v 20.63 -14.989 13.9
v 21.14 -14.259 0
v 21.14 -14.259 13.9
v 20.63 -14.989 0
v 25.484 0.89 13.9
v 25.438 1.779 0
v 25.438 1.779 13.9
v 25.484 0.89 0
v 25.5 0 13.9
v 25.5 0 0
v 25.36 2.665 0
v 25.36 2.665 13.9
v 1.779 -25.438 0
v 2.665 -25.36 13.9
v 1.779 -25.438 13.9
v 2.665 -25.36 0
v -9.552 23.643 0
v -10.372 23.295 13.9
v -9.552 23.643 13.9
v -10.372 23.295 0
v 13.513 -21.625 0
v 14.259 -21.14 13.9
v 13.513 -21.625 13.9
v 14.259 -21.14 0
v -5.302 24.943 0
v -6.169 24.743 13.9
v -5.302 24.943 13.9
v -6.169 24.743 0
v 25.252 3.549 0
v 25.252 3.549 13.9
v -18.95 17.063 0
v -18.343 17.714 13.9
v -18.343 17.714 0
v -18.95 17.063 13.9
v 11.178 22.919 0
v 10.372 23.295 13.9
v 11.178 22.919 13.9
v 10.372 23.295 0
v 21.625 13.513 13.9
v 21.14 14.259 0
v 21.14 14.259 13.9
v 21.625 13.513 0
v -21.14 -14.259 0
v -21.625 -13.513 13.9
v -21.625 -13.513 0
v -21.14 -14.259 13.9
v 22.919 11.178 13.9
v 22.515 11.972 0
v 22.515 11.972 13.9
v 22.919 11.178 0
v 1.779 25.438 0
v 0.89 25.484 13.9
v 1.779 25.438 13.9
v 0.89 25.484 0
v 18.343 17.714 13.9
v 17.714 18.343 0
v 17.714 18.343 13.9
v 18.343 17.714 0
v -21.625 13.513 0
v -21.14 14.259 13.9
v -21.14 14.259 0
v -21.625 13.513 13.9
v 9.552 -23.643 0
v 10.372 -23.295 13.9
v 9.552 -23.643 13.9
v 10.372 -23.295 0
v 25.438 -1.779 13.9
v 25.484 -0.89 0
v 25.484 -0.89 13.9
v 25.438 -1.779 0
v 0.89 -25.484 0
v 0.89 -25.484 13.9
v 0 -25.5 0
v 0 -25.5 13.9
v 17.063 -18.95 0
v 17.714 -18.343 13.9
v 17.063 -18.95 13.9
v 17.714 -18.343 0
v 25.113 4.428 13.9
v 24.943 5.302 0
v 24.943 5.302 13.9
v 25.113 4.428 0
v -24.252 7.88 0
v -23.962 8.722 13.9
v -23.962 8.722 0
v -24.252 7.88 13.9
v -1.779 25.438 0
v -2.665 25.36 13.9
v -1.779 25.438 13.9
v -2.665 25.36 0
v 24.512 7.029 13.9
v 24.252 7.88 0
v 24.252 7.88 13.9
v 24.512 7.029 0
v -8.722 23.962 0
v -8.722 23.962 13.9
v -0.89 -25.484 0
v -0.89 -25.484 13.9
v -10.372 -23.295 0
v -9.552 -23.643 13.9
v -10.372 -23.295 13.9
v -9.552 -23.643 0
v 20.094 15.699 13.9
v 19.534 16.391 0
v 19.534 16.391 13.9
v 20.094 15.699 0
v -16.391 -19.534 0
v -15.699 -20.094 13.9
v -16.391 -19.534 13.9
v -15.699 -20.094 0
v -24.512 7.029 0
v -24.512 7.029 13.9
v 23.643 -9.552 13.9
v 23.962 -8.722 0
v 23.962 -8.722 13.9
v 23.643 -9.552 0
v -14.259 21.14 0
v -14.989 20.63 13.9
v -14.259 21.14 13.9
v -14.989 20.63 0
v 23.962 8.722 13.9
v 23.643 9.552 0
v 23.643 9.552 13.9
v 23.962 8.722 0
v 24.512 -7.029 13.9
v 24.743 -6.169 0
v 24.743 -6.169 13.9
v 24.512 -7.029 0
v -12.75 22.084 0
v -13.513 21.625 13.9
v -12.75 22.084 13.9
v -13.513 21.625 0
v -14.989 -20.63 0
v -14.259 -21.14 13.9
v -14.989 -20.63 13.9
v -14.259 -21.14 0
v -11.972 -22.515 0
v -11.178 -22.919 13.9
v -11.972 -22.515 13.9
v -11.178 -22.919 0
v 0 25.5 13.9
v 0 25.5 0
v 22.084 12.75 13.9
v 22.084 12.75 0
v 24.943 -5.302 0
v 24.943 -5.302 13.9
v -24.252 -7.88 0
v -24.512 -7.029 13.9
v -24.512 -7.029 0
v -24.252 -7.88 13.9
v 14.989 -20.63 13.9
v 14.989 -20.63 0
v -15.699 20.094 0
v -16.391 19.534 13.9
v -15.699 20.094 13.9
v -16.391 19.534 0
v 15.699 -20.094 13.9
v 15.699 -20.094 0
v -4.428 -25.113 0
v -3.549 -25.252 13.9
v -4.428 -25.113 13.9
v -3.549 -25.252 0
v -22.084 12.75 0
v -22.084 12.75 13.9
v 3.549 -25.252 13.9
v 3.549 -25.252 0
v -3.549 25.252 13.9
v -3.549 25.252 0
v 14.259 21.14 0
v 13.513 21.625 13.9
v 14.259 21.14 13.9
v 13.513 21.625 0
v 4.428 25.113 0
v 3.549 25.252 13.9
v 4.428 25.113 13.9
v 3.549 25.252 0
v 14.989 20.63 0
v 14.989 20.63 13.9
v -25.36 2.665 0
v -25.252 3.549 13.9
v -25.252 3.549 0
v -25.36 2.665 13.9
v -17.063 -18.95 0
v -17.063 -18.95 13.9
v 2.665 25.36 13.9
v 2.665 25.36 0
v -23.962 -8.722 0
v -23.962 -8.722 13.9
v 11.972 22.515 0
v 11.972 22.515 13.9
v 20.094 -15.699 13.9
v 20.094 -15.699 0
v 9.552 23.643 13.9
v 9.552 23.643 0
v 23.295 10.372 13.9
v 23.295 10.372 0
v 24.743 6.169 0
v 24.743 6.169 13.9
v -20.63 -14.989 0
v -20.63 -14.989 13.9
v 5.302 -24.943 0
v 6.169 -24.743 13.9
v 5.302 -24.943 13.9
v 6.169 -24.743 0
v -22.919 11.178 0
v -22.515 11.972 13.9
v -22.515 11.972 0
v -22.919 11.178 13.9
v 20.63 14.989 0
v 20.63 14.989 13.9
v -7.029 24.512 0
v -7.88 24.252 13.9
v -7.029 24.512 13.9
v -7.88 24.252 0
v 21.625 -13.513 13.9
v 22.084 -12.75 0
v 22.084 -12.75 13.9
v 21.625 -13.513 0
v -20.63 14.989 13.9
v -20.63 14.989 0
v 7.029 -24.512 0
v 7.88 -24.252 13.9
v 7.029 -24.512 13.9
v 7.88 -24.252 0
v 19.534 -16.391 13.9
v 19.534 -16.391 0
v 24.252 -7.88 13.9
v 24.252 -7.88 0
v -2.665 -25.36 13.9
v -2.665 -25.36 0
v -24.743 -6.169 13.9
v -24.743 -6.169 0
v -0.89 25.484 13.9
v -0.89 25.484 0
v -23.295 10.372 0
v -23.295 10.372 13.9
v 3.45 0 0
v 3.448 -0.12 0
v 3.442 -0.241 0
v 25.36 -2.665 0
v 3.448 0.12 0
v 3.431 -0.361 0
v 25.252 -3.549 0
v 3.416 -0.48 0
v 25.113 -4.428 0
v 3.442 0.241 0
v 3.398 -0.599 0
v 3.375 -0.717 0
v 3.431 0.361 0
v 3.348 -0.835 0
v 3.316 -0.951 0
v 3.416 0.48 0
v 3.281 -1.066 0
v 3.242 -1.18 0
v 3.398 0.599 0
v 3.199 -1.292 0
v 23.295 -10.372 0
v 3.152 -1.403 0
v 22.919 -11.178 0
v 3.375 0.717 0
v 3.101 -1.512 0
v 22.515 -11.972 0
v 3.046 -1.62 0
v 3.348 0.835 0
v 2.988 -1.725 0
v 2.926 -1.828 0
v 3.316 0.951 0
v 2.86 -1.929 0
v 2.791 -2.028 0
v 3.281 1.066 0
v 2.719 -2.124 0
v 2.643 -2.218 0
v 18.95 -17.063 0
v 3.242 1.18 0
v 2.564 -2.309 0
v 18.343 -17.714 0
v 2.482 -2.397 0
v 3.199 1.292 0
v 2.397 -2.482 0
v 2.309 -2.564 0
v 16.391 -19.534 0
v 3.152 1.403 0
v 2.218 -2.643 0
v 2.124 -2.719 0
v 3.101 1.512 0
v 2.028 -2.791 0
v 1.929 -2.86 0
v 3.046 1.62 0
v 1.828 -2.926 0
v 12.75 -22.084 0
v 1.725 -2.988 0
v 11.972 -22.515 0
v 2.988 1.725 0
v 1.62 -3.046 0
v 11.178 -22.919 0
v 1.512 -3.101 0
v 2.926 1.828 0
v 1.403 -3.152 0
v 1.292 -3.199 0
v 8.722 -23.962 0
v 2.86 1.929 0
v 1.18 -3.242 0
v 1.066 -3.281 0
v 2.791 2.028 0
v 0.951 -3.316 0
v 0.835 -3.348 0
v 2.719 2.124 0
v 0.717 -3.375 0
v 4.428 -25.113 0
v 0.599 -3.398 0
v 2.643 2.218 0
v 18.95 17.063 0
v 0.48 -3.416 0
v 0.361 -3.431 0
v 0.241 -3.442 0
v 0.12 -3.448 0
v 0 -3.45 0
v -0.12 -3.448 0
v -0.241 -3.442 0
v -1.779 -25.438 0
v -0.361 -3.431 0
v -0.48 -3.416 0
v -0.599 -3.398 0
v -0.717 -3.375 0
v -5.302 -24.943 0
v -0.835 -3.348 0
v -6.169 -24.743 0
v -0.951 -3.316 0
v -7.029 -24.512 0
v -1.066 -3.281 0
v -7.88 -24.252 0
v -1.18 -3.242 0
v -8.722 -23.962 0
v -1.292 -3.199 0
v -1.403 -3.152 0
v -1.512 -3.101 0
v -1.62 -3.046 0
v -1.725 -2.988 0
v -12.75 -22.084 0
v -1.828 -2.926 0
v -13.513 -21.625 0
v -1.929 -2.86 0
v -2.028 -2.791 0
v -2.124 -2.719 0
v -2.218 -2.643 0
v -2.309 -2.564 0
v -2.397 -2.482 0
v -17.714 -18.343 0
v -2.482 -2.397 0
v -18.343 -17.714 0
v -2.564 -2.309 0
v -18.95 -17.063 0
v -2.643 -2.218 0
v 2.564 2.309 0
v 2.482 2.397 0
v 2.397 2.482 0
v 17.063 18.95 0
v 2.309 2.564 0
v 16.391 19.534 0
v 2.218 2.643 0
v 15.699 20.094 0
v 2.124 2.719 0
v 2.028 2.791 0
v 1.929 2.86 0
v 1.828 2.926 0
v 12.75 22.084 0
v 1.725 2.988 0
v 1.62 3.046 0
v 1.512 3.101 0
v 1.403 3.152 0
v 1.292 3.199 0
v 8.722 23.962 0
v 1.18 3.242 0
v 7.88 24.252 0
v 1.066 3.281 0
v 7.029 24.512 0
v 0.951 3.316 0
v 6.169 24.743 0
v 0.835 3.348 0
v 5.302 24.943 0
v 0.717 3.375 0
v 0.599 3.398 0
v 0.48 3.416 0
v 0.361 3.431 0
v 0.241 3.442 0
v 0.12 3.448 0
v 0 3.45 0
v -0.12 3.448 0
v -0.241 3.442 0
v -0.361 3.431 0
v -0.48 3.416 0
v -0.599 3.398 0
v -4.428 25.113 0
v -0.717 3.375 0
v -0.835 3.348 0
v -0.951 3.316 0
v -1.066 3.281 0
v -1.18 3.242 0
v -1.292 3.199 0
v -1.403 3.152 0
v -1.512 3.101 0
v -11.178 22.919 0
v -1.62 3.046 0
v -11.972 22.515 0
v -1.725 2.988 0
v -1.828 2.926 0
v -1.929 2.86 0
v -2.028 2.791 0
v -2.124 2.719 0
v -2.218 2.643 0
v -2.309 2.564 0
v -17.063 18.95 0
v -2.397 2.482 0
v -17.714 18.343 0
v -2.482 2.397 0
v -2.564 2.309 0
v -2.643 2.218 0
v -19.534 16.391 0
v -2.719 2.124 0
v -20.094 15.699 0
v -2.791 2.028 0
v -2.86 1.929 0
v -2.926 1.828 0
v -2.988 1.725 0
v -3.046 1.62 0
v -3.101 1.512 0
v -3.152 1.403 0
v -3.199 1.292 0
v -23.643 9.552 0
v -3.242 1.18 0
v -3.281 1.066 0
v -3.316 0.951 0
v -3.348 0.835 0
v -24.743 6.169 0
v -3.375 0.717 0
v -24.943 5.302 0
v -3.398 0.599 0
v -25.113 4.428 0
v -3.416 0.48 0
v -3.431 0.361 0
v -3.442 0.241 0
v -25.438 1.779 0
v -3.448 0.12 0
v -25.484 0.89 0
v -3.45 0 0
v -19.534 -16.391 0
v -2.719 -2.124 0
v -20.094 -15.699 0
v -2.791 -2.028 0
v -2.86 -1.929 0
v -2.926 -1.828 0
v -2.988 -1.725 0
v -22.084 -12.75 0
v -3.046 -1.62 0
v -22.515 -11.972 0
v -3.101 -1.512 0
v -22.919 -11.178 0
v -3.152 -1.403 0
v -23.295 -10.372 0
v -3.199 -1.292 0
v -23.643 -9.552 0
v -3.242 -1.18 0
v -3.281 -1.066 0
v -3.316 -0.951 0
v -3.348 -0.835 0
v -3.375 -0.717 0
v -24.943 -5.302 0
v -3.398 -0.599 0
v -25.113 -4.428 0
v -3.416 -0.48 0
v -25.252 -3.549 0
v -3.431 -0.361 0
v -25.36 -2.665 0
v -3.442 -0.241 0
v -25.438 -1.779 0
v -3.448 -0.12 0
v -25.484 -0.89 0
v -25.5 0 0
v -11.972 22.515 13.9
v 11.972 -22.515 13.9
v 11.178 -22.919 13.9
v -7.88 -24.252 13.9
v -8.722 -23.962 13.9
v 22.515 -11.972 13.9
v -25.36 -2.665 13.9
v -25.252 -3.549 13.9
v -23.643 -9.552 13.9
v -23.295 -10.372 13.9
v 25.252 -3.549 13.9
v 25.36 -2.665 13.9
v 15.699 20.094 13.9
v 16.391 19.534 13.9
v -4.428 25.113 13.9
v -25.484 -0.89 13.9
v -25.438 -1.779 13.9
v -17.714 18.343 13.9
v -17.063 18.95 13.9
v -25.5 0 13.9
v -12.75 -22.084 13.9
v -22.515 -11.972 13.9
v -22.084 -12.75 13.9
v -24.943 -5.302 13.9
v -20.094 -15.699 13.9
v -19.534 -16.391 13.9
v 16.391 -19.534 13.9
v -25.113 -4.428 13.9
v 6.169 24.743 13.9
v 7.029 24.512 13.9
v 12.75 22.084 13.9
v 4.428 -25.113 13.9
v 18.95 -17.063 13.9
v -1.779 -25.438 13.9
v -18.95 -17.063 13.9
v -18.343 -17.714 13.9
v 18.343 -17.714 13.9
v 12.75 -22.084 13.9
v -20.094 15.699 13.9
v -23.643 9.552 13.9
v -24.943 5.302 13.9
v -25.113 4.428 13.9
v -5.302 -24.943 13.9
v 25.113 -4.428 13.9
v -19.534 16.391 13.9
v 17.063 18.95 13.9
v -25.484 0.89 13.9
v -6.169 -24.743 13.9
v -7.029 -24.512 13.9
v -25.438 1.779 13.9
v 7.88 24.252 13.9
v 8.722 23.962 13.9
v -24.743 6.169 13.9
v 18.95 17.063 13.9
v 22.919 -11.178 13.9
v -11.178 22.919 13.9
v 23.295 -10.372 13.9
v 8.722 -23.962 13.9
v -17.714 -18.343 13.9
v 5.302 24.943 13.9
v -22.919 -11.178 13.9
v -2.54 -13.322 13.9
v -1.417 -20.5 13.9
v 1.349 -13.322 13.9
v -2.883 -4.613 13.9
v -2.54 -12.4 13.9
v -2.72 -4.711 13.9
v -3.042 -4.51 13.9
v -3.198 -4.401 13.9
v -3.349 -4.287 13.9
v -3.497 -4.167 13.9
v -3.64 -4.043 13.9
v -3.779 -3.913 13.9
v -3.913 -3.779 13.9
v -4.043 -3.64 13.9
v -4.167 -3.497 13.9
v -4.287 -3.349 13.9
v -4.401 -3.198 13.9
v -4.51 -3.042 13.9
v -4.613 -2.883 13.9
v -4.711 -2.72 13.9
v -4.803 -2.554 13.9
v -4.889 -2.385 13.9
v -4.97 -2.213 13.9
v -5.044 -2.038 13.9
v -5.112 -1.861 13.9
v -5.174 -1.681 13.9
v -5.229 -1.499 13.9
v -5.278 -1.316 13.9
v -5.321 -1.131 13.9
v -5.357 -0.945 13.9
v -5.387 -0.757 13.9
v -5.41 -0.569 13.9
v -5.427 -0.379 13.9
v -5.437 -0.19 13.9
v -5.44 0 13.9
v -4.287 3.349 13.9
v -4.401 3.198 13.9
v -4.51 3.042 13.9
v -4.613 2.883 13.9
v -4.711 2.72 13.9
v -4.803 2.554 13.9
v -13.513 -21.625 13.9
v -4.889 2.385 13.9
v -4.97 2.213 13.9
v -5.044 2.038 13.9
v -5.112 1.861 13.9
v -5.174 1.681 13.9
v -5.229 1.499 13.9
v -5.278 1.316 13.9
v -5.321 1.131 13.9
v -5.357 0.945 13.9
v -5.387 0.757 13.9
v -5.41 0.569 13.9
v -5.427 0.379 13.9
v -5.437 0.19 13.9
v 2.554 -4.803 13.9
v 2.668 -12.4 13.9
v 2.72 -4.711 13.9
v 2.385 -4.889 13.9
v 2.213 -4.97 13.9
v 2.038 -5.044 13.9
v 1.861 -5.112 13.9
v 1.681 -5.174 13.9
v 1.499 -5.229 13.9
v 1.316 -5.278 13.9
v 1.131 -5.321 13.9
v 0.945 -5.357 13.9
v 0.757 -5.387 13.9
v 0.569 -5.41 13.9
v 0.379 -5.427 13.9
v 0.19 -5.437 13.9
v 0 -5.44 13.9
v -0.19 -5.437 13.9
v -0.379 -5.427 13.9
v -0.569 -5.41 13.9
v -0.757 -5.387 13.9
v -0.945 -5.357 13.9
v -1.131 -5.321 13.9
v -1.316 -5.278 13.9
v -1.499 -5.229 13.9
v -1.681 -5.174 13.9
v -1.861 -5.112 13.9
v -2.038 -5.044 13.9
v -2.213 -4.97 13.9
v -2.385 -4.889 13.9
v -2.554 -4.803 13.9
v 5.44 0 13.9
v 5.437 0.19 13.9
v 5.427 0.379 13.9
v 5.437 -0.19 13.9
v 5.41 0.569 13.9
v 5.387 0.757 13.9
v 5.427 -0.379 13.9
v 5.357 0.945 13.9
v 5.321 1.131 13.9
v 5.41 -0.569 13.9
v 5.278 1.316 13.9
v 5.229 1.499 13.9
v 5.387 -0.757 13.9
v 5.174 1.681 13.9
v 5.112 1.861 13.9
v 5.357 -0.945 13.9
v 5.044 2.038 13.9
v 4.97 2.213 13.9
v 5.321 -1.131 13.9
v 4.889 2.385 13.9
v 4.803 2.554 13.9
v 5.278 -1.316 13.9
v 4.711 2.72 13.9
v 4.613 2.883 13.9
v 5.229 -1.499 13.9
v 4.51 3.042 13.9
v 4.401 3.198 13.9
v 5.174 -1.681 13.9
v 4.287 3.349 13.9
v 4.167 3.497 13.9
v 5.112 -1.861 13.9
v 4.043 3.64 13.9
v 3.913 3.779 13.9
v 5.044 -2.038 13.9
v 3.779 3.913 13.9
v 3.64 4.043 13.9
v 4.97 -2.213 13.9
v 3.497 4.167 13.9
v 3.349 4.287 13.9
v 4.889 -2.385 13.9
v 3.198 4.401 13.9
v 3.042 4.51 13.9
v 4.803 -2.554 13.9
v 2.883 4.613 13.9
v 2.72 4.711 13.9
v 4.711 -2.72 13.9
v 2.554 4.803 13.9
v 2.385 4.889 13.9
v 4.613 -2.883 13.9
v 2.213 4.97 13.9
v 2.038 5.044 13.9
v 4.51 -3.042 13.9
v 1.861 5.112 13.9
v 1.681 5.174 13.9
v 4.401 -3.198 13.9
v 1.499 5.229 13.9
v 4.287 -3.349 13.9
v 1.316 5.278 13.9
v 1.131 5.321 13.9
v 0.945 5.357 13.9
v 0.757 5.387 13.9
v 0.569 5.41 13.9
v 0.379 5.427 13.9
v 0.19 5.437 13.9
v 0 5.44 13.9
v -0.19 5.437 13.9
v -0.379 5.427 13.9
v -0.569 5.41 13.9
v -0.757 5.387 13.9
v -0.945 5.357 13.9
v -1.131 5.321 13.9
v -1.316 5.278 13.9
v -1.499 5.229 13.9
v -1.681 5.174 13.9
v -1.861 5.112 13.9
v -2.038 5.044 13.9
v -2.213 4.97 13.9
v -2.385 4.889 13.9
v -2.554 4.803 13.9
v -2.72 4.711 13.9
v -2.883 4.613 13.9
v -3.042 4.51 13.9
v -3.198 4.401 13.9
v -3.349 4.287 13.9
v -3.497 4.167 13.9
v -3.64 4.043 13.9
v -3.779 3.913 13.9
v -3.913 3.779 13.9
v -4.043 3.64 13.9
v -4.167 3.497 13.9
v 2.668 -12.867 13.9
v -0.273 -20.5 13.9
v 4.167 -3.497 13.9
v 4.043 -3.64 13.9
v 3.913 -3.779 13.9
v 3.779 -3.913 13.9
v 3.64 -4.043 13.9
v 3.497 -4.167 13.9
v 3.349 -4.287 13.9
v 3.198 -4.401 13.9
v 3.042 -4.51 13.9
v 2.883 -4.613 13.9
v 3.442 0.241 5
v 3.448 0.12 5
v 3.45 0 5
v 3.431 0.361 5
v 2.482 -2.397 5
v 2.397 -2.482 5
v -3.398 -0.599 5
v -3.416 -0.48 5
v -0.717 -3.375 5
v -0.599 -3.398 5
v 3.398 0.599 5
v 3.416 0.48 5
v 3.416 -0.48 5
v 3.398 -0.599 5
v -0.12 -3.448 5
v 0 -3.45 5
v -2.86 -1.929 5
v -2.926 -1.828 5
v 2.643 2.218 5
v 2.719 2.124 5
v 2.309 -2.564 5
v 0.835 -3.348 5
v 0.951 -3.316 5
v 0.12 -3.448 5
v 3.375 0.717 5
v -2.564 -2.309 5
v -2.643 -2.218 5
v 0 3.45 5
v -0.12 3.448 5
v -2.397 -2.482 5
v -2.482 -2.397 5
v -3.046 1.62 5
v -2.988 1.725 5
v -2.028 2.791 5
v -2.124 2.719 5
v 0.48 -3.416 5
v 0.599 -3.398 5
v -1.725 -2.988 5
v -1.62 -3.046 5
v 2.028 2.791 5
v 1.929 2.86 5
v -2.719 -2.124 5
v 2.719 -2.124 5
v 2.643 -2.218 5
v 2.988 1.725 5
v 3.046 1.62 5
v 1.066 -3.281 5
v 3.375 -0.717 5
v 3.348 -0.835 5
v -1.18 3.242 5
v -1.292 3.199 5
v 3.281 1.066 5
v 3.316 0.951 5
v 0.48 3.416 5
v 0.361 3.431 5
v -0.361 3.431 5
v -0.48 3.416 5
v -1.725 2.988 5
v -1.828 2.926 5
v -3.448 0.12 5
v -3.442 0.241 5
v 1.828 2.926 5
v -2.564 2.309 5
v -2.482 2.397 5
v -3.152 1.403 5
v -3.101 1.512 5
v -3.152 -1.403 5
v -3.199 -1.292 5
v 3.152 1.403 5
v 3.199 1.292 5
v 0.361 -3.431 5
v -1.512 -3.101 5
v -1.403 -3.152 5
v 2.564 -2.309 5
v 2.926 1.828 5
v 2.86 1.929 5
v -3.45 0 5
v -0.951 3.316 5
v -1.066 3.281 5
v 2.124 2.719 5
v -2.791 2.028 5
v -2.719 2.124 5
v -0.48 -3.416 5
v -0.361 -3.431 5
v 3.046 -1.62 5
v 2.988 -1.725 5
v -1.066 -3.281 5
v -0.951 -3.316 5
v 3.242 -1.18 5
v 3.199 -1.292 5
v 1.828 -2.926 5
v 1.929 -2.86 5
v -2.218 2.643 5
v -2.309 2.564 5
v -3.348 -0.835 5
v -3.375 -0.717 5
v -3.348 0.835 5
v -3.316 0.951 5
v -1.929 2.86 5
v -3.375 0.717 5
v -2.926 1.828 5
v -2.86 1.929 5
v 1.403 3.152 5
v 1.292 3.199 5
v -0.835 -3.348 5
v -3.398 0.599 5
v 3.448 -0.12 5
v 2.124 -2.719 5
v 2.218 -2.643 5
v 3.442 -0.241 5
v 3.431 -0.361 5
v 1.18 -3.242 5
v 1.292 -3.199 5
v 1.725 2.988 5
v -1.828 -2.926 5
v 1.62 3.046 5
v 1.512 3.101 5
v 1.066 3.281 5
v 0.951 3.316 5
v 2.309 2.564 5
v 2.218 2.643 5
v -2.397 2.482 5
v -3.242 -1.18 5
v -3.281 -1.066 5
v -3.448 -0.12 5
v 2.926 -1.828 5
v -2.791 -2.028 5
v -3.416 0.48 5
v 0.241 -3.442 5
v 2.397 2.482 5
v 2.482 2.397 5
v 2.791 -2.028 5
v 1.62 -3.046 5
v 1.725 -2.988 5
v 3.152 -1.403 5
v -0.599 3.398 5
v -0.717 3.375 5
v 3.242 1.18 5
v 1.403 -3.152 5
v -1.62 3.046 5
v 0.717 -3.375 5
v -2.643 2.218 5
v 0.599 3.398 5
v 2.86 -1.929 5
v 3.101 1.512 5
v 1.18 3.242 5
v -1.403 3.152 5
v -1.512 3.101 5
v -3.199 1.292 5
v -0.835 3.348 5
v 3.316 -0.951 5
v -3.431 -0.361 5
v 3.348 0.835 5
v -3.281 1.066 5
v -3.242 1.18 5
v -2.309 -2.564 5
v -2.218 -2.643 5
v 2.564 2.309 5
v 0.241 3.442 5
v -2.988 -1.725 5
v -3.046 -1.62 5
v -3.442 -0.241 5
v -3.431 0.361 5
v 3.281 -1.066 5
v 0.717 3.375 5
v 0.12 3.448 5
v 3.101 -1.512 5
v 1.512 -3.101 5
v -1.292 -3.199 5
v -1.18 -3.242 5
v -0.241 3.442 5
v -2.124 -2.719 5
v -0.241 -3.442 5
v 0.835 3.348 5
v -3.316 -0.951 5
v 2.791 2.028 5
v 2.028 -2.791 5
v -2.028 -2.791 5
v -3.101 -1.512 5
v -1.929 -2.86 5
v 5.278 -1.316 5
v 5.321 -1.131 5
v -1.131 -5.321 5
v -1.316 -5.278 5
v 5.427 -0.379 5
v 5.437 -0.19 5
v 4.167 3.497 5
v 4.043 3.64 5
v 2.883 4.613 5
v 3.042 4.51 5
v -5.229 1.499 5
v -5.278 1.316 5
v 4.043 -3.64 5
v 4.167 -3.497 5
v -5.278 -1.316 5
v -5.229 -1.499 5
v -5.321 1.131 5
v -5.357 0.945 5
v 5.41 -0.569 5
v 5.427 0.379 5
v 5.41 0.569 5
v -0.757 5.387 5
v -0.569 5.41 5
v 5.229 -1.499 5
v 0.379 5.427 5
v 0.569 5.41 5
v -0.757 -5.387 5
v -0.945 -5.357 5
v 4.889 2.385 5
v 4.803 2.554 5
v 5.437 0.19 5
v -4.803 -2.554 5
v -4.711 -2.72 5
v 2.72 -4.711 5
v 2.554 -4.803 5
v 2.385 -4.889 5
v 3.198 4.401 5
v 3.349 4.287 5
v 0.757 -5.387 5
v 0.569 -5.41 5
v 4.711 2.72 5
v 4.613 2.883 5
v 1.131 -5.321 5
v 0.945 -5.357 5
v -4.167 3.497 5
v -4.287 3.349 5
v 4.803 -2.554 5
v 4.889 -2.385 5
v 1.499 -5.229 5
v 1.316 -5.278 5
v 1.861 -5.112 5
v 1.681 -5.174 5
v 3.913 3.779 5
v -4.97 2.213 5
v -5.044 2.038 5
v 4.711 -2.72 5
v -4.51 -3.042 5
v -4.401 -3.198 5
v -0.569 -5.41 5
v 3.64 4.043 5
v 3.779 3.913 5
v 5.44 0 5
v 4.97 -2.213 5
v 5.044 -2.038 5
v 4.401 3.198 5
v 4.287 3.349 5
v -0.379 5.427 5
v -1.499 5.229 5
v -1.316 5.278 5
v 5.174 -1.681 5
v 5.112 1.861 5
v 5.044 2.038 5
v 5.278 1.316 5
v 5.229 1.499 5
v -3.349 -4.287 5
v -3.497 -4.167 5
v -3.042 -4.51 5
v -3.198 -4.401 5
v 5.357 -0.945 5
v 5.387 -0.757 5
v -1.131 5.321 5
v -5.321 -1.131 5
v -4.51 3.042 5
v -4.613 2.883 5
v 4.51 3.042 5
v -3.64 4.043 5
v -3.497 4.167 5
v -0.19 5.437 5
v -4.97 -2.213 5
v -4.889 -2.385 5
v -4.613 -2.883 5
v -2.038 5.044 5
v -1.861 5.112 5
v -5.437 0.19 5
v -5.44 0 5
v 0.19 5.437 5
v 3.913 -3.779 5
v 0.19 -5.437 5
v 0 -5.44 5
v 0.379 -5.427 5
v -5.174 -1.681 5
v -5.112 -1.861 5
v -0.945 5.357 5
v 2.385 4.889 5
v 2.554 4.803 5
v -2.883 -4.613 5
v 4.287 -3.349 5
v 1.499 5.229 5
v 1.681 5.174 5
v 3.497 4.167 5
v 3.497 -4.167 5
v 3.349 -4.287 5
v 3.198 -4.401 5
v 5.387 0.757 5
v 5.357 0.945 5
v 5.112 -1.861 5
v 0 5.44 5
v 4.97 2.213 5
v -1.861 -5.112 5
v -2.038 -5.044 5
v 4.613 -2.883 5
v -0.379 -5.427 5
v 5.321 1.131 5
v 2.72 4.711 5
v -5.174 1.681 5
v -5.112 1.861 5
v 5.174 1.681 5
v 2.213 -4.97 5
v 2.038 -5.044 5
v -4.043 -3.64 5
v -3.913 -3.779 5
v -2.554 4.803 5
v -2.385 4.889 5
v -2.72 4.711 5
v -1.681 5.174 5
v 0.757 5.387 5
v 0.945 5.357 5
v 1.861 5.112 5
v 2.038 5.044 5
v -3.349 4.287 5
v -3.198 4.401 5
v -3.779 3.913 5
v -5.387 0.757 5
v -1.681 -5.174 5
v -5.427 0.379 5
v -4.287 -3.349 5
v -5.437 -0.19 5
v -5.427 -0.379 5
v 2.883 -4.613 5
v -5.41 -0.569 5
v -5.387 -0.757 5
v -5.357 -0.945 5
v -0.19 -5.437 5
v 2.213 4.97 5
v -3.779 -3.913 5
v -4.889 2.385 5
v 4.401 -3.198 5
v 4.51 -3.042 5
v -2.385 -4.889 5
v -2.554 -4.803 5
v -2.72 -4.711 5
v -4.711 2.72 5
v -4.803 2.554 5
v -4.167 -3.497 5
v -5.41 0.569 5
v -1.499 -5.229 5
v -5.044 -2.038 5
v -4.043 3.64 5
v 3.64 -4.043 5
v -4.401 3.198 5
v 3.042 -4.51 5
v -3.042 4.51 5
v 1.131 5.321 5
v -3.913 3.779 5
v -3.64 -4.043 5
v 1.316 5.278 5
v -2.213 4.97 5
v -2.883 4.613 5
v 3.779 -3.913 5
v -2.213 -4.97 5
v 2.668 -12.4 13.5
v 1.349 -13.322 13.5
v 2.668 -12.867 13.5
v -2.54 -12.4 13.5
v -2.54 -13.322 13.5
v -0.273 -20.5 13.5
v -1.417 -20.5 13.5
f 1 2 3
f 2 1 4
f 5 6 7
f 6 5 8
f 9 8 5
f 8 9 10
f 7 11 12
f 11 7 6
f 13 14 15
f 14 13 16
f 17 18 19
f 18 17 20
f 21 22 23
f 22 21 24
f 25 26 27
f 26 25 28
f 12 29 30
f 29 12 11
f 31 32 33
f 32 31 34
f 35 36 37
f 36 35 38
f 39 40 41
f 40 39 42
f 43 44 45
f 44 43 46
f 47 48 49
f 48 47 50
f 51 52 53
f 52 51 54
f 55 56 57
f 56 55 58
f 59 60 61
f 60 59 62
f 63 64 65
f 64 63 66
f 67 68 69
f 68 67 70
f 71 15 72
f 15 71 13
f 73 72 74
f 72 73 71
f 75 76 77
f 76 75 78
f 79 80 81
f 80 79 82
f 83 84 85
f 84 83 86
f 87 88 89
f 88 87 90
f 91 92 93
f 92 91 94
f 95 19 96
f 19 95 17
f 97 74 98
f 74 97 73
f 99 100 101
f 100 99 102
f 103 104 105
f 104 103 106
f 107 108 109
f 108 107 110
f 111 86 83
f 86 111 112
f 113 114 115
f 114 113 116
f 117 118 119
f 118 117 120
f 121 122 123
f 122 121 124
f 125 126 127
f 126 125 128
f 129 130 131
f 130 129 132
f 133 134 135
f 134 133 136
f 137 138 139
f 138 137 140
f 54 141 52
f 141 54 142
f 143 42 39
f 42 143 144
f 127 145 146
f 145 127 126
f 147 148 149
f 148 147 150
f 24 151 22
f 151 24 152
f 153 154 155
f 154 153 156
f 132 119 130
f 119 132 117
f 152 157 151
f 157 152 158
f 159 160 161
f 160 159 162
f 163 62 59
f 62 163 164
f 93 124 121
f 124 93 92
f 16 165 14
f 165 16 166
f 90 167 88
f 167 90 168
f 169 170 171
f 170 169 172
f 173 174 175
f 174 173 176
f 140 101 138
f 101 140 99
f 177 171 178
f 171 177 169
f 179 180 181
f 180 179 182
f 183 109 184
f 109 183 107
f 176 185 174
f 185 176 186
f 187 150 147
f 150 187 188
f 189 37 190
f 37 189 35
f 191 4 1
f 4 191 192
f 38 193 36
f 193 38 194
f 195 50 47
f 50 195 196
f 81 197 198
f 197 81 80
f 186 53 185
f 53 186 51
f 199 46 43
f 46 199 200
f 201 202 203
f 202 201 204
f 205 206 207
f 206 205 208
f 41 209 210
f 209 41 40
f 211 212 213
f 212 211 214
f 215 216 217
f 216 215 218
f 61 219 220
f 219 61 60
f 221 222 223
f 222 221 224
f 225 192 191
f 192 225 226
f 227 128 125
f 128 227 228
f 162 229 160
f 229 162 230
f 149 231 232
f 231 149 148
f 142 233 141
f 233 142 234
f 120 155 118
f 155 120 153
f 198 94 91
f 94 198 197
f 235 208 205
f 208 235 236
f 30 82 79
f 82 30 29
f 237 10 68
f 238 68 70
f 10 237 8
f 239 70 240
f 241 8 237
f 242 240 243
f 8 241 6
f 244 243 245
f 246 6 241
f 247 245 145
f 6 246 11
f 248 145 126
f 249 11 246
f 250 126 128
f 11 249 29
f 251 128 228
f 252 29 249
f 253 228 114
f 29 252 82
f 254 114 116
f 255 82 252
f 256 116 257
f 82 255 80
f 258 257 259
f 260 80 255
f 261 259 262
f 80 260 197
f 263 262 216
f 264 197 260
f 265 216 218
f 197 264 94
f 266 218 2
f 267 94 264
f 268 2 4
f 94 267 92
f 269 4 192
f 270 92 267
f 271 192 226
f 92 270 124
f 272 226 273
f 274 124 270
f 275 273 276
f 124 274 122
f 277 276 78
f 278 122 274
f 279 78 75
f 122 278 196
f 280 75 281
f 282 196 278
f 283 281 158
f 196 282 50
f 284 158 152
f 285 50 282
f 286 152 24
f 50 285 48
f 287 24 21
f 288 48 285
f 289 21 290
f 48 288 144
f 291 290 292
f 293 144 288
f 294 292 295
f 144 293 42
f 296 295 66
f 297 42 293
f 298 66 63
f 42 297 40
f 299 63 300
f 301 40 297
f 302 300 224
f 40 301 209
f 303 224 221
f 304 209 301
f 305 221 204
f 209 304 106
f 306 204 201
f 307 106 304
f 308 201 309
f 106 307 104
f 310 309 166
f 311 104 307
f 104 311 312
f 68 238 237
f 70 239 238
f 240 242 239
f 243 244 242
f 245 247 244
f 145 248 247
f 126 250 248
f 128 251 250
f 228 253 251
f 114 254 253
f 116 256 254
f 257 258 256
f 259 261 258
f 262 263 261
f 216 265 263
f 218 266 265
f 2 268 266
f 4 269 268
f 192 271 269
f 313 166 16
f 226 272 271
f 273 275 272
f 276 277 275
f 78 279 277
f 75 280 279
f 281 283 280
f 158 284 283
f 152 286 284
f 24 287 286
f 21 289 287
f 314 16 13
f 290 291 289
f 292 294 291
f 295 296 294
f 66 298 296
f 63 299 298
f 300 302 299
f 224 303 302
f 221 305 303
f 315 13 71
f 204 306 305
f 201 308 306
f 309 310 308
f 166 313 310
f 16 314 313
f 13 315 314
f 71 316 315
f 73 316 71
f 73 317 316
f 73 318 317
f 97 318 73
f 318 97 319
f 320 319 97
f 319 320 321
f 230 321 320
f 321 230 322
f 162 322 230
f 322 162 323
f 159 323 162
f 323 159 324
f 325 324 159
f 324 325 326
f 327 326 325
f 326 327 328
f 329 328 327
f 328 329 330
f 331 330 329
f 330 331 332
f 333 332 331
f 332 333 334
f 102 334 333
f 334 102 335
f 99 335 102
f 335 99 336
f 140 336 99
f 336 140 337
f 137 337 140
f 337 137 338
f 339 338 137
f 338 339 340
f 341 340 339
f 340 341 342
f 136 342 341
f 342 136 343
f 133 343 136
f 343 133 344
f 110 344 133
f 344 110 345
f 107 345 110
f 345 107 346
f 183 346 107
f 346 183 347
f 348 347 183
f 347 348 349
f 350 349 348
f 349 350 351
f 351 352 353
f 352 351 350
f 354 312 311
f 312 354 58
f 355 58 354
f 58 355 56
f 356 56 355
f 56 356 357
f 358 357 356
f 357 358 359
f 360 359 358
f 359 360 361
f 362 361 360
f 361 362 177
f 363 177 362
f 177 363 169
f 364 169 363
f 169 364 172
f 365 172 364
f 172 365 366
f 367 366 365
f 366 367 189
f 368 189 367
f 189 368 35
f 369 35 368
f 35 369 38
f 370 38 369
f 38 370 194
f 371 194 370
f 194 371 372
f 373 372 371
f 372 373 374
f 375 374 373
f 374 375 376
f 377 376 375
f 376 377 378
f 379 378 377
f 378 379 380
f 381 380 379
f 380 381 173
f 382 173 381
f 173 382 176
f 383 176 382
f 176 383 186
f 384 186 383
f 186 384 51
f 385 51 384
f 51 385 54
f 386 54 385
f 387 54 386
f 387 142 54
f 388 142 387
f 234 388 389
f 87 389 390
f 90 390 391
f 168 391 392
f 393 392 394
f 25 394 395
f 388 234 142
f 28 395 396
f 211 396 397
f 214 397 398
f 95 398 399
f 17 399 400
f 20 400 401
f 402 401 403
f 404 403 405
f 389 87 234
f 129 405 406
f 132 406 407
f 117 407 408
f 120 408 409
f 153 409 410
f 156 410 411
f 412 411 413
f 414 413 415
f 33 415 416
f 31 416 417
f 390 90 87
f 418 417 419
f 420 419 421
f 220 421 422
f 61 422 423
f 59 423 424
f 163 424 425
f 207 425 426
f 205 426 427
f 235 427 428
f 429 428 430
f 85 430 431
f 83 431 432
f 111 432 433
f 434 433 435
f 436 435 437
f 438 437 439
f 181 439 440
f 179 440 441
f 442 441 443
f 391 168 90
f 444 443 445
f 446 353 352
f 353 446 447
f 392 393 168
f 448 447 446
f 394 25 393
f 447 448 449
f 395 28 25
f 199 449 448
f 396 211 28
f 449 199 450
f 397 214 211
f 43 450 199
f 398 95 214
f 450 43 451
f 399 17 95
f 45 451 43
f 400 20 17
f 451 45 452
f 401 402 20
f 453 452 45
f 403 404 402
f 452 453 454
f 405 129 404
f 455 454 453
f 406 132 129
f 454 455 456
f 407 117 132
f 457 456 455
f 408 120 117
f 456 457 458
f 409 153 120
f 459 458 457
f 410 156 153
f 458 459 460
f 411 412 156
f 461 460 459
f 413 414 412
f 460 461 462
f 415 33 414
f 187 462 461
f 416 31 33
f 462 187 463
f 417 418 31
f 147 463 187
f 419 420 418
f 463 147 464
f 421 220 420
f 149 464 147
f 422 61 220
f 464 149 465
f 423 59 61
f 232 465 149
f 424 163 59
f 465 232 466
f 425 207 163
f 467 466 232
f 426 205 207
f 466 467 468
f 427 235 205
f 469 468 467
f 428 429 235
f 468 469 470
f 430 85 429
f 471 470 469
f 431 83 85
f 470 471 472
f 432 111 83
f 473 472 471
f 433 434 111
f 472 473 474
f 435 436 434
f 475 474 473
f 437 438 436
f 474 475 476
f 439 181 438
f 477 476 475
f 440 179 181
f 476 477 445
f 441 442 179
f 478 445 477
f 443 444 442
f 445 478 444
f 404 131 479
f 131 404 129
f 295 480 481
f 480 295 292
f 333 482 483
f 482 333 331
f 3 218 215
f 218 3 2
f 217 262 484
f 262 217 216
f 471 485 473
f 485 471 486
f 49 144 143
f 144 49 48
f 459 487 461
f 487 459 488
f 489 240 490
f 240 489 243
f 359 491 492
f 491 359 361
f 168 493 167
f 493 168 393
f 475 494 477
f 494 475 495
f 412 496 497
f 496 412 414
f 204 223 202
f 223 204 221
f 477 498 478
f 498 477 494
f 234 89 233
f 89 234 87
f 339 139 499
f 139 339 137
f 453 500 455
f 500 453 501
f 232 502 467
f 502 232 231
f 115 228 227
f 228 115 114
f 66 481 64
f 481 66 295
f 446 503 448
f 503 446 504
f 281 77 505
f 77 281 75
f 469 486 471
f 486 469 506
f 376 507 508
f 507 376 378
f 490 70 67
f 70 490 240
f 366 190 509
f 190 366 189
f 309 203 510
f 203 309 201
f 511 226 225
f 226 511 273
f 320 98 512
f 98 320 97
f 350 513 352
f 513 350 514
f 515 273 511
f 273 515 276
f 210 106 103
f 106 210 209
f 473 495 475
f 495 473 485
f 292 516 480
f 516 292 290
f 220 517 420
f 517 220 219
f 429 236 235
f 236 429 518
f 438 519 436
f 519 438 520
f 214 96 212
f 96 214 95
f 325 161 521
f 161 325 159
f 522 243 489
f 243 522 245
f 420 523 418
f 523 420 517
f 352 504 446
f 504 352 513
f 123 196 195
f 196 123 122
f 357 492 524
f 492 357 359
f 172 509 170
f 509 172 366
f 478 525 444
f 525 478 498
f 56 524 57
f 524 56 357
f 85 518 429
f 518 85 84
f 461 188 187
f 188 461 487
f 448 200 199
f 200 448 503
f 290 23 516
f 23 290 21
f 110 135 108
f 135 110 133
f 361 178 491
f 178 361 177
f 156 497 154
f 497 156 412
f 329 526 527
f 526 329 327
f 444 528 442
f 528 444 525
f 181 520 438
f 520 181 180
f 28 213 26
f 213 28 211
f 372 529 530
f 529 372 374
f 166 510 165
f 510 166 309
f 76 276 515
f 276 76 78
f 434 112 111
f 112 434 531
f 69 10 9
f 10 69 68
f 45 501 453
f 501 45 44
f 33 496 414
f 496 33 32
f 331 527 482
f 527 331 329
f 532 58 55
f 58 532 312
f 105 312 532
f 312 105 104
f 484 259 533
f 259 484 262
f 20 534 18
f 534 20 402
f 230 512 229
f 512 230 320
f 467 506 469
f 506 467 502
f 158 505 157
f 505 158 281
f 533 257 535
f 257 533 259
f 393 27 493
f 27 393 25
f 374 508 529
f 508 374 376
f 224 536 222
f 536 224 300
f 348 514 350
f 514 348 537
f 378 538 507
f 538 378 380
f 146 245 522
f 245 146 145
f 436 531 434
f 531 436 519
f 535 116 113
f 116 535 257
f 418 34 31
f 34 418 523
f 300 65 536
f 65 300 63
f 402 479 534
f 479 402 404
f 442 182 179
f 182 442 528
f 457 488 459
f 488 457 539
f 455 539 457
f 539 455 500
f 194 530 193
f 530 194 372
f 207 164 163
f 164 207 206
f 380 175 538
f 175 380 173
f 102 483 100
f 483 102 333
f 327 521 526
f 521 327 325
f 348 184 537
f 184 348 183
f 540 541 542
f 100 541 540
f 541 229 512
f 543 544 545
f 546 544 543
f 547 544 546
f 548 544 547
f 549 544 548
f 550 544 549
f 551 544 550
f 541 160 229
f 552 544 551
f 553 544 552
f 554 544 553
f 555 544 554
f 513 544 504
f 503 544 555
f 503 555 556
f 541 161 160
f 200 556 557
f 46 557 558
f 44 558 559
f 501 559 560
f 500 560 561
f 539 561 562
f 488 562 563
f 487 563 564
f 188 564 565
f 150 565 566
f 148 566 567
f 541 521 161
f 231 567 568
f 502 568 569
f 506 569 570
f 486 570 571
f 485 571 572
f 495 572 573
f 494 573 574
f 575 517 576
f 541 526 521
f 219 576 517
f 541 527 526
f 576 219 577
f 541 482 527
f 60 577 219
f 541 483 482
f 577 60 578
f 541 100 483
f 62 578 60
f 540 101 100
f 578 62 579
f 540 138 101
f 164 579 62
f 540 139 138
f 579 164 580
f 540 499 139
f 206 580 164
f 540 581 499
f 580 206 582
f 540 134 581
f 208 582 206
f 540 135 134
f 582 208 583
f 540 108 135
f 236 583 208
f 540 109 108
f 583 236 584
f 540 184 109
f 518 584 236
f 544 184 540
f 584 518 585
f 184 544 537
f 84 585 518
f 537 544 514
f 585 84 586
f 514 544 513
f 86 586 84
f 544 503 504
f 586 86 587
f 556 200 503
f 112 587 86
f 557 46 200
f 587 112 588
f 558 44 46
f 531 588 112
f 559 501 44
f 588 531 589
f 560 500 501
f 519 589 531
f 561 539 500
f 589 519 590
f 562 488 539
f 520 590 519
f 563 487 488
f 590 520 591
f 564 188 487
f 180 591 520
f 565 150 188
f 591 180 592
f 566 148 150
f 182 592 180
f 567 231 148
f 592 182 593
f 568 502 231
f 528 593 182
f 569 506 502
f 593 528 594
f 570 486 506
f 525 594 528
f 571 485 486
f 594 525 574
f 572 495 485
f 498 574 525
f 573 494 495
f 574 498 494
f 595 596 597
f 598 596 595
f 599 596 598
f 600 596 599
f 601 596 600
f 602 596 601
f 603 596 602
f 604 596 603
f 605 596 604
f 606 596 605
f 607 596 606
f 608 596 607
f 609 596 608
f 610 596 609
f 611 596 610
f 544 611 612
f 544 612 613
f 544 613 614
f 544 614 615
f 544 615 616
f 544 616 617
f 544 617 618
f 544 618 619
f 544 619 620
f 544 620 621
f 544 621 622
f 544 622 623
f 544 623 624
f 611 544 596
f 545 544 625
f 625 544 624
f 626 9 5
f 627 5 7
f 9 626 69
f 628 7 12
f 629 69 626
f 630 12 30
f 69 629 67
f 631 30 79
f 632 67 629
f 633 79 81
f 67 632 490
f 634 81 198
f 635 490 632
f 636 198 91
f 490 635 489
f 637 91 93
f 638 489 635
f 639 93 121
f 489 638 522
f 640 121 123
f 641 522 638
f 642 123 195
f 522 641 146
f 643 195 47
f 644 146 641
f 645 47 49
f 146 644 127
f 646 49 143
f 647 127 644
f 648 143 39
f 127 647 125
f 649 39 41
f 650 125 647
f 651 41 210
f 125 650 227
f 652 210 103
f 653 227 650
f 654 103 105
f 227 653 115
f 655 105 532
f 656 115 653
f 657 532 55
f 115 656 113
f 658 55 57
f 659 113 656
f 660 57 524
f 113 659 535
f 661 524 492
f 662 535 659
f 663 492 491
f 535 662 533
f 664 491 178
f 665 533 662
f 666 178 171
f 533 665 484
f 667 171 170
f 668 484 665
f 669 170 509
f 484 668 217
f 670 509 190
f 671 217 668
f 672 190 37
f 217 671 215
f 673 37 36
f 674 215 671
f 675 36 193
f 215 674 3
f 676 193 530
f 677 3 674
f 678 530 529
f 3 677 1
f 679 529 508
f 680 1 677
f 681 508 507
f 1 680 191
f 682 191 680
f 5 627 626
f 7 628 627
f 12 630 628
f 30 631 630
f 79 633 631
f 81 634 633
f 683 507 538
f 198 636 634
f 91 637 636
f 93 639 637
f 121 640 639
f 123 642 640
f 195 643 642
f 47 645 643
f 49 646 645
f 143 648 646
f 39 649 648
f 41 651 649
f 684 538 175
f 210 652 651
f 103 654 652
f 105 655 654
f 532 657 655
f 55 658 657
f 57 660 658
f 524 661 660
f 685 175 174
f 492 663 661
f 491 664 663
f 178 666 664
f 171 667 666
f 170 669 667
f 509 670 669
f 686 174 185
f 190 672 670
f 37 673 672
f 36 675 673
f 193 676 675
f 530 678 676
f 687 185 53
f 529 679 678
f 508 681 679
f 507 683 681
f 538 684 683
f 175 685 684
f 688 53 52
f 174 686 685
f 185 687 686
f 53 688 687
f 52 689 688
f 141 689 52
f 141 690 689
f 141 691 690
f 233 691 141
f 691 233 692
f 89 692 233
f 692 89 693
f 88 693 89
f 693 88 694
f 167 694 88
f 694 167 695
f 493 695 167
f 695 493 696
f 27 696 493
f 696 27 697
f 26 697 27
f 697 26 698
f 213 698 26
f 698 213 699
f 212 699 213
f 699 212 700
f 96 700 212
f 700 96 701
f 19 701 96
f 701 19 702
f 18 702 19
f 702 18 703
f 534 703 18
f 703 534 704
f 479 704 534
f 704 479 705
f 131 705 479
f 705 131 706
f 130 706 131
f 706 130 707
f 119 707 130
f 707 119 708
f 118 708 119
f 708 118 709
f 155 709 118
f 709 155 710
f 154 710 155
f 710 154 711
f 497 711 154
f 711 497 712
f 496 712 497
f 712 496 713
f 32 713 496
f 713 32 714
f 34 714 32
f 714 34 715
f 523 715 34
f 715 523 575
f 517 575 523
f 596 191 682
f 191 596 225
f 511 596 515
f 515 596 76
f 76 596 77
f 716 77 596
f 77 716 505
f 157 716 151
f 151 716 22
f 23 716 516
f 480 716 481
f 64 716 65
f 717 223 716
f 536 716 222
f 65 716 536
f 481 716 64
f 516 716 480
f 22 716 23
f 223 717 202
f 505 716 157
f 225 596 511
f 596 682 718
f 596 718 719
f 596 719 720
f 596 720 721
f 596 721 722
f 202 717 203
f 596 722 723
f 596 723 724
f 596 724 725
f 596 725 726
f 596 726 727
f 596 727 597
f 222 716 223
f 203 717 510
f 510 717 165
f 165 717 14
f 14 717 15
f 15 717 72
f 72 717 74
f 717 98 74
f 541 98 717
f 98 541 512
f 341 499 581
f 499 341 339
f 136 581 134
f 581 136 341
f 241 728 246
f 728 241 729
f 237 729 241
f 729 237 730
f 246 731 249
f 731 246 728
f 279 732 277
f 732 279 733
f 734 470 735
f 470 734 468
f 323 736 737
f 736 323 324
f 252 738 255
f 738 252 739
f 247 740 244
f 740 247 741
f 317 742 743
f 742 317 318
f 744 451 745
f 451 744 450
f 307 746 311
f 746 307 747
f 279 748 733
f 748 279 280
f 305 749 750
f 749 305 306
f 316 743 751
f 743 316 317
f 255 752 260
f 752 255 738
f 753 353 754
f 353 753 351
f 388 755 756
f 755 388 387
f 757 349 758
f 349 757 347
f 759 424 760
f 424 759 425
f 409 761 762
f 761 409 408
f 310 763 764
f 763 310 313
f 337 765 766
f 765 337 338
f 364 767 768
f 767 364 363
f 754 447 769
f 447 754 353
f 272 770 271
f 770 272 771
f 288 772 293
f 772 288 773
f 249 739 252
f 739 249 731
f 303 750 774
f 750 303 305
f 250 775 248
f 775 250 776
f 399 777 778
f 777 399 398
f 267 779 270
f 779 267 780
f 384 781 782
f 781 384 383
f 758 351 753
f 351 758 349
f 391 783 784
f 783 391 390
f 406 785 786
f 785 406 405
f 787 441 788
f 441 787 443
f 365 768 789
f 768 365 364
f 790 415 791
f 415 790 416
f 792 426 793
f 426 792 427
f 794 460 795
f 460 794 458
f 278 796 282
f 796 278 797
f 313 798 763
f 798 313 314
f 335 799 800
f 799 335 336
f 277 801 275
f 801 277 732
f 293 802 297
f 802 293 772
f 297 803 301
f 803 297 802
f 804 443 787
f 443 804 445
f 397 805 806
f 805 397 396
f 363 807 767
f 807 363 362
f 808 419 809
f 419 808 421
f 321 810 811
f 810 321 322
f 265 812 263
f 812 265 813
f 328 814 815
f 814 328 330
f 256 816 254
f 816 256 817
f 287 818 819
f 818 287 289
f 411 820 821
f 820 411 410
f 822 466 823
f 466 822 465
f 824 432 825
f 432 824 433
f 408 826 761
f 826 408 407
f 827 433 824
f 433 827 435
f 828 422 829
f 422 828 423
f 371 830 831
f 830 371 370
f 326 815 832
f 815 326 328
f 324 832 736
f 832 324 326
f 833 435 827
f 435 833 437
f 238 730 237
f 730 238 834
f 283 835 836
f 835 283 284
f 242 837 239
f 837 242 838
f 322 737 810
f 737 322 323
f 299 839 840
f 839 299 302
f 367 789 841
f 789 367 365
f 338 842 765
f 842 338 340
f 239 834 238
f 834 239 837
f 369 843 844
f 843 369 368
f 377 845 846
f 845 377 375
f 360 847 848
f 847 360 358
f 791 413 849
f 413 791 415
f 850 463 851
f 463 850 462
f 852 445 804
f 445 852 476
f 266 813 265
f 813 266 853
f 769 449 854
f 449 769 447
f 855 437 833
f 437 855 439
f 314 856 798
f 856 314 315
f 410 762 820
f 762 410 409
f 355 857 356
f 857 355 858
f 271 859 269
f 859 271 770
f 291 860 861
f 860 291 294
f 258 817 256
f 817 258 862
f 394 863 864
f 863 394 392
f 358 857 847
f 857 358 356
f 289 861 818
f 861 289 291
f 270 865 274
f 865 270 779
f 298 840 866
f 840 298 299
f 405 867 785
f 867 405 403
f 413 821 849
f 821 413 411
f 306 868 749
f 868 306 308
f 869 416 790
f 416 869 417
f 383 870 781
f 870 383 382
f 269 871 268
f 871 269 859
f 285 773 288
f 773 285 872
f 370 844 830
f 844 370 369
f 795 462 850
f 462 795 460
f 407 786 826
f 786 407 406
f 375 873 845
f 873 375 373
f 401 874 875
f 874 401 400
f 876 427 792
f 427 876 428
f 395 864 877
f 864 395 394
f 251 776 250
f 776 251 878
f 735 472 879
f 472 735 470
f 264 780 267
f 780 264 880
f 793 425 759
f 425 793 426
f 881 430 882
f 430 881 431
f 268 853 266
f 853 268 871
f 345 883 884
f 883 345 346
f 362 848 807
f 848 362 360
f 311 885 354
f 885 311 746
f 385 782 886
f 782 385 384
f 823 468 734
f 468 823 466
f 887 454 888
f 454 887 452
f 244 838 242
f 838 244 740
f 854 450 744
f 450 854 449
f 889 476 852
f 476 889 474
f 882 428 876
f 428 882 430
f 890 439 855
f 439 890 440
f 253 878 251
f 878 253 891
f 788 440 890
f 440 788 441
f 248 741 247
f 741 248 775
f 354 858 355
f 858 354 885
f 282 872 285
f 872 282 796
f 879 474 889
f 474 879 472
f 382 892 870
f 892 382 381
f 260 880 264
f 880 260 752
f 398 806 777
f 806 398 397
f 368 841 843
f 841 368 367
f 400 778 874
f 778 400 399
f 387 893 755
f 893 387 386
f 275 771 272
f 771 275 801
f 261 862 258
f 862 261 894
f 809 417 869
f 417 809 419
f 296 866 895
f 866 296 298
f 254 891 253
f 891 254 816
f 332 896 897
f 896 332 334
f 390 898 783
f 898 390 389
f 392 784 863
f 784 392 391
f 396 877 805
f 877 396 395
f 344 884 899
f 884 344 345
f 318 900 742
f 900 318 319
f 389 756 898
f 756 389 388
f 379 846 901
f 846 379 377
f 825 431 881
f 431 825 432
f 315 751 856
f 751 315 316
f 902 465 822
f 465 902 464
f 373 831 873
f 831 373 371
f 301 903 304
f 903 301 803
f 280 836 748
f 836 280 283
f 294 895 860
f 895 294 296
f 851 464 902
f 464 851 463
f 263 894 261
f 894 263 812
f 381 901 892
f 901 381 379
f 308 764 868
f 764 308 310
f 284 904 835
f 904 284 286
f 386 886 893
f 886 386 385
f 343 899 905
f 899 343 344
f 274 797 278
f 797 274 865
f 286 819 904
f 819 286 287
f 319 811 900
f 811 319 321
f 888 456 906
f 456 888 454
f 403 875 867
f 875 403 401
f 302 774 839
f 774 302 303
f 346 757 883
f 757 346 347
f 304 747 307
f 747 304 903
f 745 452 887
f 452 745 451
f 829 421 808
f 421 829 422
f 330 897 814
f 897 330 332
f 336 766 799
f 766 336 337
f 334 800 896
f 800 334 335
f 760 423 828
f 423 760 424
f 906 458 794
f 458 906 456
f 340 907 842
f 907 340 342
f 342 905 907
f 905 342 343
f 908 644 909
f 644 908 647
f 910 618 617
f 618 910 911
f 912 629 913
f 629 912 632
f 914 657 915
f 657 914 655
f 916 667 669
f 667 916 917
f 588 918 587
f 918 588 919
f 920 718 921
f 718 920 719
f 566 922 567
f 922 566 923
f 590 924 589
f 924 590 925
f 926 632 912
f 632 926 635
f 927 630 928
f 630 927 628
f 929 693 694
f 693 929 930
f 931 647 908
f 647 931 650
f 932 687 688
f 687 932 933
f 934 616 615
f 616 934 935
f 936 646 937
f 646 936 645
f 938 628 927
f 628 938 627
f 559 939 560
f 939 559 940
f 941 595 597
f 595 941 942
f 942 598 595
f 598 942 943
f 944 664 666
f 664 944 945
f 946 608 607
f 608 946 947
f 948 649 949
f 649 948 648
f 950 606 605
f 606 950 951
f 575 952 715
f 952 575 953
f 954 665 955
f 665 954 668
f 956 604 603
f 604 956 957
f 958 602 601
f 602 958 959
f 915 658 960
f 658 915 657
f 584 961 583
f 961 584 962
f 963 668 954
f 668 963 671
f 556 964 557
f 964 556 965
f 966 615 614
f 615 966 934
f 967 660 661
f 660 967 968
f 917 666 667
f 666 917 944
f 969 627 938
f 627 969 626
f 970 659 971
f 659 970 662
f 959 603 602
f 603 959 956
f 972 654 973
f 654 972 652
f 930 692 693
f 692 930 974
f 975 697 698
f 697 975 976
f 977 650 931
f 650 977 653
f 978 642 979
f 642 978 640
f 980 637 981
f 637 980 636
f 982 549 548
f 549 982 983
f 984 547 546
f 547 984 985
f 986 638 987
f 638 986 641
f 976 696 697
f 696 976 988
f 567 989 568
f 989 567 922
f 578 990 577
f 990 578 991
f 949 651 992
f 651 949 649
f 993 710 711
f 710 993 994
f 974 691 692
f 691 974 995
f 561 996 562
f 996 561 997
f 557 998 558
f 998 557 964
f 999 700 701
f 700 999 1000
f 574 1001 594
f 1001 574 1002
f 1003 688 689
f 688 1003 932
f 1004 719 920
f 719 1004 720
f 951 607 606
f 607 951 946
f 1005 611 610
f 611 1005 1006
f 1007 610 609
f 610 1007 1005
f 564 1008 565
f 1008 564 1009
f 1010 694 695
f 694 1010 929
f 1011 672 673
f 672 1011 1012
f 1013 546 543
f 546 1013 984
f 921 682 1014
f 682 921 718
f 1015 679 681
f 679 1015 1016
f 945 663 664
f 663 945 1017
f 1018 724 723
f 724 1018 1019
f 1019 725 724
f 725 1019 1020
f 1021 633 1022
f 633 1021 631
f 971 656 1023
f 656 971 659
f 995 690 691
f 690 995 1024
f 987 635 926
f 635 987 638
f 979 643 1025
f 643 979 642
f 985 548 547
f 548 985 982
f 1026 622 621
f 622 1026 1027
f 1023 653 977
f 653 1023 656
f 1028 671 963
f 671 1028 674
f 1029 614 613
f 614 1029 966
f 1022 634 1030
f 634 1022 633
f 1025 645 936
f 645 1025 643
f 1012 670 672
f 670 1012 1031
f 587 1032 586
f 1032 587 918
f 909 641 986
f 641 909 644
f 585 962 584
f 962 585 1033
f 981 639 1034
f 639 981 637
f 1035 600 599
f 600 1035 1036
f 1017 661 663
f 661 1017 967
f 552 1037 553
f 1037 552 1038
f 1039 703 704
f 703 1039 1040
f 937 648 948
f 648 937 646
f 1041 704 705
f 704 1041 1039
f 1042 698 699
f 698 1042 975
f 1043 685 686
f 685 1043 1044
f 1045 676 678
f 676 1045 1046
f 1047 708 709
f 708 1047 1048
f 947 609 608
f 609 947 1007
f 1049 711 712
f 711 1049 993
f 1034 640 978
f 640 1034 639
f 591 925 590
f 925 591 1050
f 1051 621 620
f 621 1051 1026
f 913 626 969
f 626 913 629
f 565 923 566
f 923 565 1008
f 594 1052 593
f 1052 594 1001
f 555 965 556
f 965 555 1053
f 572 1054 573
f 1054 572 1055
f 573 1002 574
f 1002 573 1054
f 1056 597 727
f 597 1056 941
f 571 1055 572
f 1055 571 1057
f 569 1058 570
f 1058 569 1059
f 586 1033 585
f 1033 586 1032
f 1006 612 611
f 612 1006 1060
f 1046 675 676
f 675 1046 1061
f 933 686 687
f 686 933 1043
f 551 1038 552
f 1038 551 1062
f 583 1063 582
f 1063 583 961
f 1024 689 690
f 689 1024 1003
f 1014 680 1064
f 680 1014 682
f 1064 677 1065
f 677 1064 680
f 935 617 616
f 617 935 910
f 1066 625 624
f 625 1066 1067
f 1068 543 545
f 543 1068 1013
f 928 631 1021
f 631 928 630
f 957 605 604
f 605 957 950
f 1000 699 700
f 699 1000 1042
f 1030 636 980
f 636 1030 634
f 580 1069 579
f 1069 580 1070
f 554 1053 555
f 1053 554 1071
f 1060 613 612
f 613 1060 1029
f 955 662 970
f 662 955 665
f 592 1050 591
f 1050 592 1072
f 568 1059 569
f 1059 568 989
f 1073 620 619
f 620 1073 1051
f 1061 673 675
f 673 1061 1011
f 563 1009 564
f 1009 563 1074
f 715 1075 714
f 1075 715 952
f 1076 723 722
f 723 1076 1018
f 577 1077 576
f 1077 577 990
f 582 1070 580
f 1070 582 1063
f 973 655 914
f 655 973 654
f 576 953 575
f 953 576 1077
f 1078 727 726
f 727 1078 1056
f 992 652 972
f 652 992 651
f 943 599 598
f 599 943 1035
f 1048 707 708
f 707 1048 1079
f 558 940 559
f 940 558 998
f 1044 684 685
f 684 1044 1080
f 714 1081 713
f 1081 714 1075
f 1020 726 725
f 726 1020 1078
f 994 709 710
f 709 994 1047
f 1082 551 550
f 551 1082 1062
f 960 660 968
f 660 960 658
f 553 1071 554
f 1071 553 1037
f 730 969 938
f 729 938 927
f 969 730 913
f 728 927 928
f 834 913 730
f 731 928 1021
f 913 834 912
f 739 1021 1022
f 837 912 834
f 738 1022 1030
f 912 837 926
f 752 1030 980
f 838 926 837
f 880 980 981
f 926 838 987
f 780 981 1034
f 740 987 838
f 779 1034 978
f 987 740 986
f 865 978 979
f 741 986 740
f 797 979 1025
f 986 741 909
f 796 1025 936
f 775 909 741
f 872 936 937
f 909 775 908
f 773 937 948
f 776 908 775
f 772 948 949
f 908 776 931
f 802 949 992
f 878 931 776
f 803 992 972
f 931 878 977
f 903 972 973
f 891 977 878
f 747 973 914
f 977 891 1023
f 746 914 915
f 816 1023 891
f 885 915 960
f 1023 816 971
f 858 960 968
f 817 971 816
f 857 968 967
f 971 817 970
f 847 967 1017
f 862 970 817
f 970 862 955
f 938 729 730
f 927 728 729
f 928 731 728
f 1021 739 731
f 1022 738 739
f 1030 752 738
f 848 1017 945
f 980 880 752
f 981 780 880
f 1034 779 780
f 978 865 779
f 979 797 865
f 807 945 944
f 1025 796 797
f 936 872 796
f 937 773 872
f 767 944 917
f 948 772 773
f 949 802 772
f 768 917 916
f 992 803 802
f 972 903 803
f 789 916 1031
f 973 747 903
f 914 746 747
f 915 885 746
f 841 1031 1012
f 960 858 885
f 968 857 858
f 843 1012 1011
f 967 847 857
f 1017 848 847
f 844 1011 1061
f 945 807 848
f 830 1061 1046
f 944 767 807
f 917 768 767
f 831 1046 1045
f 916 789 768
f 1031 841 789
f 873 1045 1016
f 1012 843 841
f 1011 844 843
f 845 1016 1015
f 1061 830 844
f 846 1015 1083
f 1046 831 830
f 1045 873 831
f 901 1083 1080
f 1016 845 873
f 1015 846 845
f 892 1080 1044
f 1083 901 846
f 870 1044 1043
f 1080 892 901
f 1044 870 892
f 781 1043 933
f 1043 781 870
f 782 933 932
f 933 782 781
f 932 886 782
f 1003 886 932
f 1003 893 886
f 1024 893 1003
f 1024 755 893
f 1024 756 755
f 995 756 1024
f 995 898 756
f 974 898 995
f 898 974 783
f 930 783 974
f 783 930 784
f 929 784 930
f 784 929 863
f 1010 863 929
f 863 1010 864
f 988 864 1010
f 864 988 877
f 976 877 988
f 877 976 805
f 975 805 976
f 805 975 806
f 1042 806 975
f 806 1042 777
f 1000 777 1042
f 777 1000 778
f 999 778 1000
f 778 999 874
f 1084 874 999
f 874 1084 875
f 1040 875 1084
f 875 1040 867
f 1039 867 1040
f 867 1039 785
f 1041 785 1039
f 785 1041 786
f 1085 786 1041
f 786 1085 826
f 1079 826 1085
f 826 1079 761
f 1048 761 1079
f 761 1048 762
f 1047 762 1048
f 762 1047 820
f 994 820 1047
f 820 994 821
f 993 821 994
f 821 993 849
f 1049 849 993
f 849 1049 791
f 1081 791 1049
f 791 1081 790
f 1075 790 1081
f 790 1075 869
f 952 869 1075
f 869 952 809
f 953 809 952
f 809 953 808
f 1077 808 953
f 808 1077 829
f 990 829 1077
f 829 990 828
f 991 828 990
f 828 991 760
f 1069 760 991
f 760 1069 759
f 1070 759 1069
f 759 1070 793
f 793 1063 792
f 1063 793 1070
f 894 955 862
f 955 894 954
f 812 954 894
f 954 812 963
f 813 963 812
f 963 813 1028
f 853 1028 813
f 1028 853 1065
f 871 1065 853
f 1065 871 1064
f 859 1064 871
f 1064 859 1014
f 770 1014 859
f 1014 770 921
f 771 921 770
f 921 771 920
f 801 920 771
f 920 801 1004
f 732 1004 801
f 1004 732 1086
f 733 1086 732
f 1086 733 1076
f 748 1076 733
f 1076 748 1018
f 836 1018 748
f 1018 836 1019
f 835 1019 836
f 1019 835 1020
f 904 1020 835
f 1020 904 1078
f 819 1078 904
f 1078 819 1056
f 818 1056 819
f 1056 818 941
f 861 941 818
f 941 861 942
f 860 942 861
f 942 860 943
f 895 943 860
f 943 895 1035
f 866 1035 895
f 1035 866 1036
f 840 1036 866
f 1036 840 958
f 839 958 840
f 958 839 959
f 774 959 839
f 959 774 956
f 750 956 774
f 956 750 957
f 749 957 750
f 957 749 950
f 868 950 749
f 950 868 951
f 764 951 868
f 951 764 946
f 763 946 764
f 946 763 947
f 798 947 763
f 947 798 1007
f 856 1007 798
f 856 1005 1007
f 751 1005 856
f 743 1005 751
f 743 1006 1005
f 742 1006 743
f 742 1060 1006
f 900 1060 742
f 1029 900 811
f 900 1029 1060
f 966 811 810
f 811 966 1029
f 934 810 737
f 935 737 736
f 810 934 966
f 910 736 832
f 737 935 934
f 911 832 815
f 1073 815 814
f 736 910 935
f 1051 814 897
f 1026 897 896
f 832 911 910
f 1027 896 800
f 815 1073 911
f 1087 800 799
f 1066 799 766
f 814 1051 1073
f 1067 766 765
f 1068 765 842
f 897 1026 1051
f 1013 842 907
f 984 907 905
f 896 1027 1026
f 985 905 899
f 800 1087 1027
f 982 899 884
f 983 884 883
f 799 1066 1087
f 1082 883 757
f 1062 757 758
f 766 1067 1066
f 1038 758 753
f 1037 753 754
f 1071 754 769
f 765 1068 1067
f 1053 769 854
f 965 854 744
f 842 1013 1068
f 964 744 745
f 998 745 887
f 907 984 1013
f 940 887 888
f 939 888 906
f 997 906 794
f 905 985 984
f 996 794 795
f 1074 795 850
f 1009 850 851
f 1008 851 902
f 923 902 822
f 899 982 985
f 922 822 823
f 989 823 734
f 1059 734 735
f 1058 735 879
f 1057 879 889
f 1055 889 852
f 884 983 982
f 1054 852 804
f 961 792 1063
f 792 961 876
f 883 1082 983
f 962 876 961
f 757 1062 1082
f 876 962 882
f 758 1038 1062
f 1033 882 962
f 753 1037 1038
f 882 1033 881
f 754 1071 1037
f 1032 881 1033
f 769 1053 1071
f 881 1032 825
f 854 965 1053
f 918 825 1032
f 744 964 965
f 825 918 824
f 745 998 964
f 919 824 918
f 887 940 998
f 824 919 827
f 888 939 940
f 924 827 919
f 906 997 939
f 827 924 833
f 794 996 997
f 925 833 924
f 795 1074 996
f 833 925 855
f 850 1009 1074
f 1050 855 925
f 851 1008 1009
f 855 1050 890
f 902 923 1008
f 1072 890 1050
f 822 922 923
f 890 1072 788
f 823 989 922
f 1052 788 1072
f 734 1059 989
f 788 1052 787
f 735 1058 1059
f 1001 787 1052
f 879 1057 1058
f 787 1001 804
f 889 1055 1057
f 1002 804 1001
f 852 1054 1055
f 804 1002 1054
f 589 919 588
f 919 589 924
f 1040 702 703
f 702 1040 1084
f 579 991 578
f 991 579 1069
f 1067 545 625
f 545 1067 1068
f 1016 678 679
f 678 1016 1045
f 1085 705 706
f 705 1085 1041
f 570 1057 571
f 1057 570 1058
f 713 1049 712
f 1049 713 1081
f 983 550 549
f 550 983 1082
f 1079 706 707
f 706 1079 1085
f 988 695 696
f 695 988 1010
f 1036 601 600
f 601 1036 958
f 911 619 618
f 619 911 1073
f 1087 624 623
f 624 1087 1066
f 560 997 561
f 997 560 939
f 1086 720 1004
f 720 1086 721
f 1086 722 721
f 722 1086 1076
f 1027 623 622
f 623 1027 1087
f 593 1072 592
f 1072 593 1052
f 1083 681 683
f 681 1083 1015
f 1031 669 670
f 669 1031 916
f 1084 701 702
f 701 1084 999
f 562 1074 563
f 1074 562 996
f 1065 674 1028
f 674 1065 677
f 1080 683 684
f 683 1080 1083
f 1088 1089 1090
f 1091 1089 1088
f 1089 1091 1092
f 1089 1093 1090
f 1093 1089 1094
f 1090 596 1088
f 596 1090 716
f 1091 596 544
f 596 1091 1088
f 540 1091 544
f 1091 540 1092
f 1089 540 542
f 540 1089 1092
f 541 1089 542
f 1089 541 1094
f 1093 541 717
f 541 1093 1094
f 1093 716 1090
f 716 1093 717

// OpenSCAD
$fn=180;
eps=0.01;

total_rad=51/2;
collar_rad=10.88/2;
screw_rad=6.9/2;
adj=-13.15+8;

thick=19.05+adj;
num="7";

difference() {
    cylinder(thick, total_rad, total_rad);
    translate([0, 0, -eps]) cylinder(99, screw_rad, screw_rad);
    translate([0, 0, 5]) cylinder(99, collar_rad, collar_rad);
    translate([0, -total_rad+5, thick-0.4])
        linear_extrude(height=99)
        text(num, size=8, 
            font="Routed Gothic:style=Regular", halign="center");
}
